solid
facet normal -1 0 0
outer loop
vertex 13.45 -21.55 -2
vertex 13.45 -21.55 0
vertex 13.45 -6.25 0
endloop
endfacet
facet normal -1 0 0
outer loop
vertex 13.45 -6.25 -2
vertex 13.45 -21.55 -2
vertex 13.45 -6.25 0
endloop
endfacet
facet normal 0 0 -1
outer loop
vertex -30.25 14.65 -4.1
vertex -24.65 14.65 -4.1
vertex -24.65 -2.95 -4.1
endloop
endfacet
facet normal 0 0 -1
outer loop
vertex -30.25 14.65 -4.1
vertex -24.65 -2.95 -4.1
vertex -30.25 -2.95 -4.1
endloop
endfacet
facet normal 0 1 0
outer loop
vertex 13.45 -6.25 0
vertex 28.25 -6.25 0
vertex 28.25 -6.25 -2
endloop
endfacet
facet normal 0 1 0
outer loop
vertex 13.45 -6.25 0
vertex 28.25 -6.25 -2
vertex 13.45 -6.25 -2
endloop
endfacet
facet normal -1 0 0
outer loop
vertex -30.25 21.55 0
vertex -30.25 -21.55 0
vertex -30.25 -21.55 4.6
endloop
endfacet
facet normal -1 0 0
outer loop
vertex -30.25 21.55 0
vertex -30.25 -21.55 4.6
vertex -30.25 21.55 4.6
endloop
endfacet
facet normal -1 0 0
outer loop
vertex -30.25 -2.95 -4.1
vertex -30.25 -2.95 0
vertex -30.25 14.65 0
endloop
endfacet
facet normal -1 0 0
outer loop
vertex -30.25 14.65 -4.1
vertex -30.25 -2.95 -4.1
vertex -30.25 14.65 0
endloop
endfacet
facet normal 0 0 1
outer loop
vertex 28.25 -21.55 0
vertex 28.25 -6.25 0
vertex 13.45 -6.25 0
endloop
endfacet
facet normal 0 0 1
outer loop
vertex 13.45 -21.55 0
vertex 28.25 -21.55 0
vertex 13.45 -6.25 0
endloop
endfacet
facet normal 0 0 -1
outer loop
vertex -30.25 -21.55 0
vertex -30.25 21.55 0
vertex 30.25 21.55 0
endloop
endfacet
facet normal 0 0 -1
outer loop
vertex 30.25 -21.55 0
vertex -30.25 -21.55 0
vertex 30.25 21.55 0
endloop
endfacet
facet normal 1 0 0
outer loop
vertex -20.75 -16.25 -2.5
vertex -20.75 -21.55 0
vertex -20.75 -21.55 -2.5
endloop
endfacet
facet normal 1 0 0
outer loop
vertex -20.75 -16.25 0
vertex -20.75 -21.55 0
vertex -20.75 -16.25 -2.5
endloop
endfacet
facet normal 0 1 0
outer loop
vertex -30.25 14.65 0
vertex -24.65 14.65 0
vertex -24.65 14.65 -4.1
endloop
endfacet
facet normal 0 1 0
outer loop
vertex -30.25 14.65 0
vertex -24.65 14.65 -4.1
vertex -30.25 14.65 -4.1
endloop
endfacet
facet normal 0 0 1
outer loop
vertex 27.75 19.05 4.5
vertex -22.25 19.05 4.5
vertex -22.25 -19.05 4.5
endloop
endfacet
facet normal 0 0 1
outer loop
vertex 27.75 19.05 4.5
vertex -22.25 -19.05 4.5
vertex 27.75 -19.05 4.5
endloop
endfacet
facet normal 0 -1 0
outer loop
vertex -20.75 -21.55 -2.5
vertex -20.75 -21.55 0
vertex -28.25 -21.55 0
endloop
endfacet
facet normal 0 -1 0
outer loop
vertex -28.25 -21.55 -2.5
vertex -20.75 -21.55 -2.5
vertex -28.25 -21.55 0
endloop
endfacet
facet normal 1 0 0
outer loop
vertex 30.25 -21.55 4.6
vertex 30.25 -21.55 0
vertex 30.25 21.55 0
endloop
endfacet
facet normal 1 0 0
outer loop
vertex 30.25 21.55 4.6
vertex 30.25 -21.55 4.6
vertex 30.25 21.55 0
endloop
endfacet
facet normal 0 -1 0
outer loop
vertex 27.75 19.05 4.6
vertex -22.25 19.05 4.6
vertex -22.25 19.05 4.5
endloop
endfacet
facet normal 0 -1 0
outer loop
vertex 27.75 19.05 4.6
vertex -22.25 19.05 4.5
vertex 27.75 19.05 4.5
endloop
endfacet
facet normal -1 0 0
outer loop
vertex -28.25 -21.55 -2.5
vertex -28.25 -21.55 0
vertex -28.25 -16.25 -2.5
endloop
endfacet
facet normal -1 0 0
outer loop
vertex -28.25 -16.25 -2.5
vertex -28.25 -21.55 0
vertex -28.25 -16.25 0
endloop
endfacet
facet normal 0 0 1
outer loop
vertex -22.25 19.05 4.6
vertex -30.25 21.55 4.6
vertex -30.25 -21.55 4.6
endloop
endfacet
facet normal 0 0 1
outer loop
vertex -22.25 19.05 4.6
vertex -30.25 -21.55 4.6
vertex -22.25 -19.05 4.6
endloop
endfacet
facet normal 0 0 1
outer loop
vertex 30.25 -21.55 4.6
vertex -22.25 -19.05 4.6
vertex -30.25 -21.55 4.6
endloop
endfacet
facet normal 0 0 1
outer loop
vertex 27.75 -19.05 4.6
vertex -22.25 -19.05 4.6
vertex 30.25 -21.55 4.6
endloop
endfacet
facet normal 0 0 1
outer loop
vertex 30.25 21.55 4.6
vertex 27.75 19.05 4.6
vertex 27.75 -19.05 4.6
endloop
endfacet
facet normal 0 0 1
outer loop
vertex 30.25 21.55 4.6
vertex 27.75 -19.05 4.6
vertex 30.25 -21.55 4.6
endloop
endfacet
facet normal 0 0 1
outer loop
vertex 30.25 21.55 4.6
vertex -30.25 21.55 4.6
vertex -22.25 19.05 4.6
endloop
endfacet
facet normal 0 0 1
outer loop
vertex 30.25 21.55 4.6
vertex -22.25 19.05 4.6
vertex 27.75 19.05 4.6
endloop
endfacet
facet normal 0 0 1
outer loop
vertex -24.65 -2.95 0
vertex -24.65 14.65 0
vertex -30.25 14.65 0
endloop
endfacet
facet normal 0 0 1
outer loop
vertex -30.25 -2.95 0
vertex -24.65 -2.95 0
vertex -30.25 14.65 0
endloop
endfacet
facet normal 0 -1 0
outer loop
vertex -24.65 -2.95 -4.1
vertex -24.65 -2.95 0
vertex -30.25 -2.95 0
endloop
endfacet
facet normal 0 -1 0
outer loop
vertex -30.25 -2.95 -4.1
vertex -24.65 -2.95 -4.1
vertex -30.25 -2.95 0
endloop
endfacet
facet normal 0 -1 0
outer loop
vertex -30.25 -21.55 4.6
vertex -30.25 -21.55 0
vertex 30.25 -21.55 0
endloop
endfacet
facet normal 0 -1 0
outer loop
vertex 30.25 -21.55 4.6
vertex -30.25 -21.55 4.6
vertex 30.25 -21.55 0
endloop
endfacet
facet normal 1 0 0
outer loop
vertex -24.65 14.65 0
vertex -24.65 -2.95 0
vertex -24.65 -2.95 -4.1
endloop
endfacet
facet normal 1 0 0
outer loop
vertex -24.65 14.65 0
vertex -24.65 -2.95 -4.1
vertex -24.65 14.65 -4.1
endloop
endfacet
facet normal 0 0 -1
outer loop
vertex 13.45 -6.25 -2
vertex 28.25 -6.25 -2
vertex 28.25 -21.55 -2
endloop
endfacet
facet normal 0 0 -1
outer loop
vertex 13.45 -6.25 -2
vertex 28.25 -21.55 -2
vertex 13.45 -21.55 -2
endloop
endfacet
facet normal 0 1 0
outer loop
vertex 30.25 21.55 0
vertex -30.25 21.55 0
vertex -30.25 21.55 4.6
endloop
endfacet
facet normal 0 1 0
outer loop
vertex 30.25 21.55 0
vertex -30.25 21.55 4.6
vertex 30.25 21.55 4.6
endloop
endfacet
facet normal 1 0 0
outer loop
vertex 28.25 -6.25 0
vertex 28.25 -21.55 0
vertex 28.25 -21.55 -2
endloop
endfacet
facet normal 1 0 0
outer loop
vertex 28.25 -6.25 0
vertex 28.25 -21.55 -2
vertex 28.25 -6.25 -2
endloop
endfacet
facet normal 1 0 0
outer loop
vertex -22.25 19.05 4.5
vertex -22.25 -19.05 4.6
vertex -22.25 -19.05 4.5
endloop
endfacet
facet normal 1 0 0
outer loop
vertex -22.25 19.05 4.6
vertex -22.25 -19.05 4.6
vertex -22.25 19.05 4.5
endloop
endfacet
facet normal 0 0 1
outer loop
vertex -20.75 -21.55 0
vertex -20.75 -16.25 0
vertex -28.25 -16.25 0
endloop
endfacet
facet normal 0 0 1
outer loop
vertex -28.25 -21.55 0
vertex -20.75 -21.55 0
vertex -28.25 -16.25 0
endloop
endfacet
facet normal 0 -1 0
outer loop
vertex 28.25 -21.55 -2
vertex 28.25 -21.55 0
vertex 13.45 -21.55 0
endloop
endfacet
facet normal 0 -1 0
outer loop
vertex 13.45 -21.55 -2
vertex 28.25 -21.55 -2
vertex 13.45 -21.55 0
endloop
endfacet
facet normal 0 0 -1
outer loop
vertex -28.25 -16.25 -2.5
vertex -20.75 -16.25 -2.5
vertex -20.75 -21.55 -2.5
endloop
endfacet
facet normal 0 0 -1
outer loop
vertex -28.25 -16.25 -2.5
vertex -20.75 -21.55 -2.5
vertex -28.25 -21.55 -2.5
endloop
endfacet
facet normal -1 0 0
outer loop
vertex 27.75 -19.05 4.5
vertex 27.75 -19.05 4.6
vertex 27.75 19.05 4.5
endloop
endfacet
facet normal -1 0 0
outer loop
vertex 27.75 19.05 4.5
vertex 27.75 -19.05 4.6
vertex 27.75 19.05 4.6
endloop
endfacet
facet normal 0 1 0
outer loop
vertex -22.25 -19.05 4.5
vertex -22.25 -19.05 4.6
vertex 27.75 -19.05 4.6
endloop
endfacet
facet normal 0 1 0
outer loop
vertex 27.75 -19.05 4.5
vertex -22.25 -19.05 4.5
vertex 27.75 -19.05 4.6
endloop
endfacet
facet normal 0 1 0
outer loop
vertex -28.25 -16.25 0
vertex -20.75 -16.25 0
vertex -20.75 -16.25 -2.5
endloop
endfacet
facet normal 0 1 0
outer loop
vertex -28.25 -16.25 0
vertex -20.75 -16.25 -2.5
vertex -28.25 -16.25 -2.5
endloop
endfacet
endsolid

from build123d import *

# Parameters (mm, degrees)
ESQUISSE1_W             = 60.5
ESQUISSE1_H             = 43.1
BOSS_EXTRU_1_DEPTH      = 4.6
ESQUISSE2_W             = 50
ESQUISSE2_H             = 38.1
ENL_V_MAT_EXTRU_1_DEPTH = 0.1
ESQUISSE3_W             = 7.5
ESQUISSE3_H             = 5.3
BOSS_EXTRU_2_DEPTH      = 2.5
ESQUISSE4_W             = 5.6
ESQUISSE4_H             = 17.6
BOSS_EXTRU_3_DEPTH      = 4.1
ESQUISSE5_W             = 14.8
ESQUISSE5_H             = 15.3
BOSS_EXTRU_4_DEPTH      = 2


with BuildPart() as part:
    # Esquisse1 → Boss.-Extru.1 (new body)
    with BuildSketch(Plane.XY):
        Rectangle(ESQUISSE1_W, ESQUISSE1_H)
    extrude(amount=BOSS_EXTRU_1_DEPTH)

    # Esquisse2 → Enlèv. mat.-Extru.1 (cut)
    with BuildSketch(Plane.XY.offset(4.6)):
        with Locations((2.75, 0)):
            Rectangle(ESQUISSE2_W, ESQUISSE2_H)
    extrude(amount=-ENL_V_MAT_EXTRU_1_DEPTH, mode=Mode.SUBTRACT)


with BuildPart() as body_2:
    # Esquisse3 → Boss.-Extru.2 (new body)
    with BuildSketch(Plane(origin=(0, 0, 0), x_dir=(-1, 0, 0), z_dir=(0, 0, -1))):
        with Locations((24.5, -18.9)):
            Rectangle(ESQUISSE3_W, ESQUISSE3_H)
    extrude(amount=BOSS_EXTRU_2_DEPTH)


with BuildPart() as body_3:
    # Esquisse4 → Boss.-Extru.3 (new body)
    with BuildSketch(Plane(origin=(0, 0, 0), x_dir=(-1, 0, 0), z_dir=(0, 0, -1))):
        with Locations((27.45, 5.85)):
            Rectangle(ESQUISSE4_W, ESQUISSE4_H)
    extrude(amount=BOSS_EXTRU_3_DEPTH)


with BuildPart() as body_4:
    # Esquisse5 → Boss.-Extru.4 (new body)
    with BuildSketch(Plane(origin=(0, 0, 0), x_dir=(-1, 0, 0), z_dir=(0, 0, -1))):
        with Locations((-20.85, -13.9)):
            Rectangle(ESQUISSE5_W, ESQUISSE5_H)
    extrude(amount=BOSS_EXTRU_4_DEPTH)


solid = Compound([part.part, body_2.part, body_3.part, body_4.part])
